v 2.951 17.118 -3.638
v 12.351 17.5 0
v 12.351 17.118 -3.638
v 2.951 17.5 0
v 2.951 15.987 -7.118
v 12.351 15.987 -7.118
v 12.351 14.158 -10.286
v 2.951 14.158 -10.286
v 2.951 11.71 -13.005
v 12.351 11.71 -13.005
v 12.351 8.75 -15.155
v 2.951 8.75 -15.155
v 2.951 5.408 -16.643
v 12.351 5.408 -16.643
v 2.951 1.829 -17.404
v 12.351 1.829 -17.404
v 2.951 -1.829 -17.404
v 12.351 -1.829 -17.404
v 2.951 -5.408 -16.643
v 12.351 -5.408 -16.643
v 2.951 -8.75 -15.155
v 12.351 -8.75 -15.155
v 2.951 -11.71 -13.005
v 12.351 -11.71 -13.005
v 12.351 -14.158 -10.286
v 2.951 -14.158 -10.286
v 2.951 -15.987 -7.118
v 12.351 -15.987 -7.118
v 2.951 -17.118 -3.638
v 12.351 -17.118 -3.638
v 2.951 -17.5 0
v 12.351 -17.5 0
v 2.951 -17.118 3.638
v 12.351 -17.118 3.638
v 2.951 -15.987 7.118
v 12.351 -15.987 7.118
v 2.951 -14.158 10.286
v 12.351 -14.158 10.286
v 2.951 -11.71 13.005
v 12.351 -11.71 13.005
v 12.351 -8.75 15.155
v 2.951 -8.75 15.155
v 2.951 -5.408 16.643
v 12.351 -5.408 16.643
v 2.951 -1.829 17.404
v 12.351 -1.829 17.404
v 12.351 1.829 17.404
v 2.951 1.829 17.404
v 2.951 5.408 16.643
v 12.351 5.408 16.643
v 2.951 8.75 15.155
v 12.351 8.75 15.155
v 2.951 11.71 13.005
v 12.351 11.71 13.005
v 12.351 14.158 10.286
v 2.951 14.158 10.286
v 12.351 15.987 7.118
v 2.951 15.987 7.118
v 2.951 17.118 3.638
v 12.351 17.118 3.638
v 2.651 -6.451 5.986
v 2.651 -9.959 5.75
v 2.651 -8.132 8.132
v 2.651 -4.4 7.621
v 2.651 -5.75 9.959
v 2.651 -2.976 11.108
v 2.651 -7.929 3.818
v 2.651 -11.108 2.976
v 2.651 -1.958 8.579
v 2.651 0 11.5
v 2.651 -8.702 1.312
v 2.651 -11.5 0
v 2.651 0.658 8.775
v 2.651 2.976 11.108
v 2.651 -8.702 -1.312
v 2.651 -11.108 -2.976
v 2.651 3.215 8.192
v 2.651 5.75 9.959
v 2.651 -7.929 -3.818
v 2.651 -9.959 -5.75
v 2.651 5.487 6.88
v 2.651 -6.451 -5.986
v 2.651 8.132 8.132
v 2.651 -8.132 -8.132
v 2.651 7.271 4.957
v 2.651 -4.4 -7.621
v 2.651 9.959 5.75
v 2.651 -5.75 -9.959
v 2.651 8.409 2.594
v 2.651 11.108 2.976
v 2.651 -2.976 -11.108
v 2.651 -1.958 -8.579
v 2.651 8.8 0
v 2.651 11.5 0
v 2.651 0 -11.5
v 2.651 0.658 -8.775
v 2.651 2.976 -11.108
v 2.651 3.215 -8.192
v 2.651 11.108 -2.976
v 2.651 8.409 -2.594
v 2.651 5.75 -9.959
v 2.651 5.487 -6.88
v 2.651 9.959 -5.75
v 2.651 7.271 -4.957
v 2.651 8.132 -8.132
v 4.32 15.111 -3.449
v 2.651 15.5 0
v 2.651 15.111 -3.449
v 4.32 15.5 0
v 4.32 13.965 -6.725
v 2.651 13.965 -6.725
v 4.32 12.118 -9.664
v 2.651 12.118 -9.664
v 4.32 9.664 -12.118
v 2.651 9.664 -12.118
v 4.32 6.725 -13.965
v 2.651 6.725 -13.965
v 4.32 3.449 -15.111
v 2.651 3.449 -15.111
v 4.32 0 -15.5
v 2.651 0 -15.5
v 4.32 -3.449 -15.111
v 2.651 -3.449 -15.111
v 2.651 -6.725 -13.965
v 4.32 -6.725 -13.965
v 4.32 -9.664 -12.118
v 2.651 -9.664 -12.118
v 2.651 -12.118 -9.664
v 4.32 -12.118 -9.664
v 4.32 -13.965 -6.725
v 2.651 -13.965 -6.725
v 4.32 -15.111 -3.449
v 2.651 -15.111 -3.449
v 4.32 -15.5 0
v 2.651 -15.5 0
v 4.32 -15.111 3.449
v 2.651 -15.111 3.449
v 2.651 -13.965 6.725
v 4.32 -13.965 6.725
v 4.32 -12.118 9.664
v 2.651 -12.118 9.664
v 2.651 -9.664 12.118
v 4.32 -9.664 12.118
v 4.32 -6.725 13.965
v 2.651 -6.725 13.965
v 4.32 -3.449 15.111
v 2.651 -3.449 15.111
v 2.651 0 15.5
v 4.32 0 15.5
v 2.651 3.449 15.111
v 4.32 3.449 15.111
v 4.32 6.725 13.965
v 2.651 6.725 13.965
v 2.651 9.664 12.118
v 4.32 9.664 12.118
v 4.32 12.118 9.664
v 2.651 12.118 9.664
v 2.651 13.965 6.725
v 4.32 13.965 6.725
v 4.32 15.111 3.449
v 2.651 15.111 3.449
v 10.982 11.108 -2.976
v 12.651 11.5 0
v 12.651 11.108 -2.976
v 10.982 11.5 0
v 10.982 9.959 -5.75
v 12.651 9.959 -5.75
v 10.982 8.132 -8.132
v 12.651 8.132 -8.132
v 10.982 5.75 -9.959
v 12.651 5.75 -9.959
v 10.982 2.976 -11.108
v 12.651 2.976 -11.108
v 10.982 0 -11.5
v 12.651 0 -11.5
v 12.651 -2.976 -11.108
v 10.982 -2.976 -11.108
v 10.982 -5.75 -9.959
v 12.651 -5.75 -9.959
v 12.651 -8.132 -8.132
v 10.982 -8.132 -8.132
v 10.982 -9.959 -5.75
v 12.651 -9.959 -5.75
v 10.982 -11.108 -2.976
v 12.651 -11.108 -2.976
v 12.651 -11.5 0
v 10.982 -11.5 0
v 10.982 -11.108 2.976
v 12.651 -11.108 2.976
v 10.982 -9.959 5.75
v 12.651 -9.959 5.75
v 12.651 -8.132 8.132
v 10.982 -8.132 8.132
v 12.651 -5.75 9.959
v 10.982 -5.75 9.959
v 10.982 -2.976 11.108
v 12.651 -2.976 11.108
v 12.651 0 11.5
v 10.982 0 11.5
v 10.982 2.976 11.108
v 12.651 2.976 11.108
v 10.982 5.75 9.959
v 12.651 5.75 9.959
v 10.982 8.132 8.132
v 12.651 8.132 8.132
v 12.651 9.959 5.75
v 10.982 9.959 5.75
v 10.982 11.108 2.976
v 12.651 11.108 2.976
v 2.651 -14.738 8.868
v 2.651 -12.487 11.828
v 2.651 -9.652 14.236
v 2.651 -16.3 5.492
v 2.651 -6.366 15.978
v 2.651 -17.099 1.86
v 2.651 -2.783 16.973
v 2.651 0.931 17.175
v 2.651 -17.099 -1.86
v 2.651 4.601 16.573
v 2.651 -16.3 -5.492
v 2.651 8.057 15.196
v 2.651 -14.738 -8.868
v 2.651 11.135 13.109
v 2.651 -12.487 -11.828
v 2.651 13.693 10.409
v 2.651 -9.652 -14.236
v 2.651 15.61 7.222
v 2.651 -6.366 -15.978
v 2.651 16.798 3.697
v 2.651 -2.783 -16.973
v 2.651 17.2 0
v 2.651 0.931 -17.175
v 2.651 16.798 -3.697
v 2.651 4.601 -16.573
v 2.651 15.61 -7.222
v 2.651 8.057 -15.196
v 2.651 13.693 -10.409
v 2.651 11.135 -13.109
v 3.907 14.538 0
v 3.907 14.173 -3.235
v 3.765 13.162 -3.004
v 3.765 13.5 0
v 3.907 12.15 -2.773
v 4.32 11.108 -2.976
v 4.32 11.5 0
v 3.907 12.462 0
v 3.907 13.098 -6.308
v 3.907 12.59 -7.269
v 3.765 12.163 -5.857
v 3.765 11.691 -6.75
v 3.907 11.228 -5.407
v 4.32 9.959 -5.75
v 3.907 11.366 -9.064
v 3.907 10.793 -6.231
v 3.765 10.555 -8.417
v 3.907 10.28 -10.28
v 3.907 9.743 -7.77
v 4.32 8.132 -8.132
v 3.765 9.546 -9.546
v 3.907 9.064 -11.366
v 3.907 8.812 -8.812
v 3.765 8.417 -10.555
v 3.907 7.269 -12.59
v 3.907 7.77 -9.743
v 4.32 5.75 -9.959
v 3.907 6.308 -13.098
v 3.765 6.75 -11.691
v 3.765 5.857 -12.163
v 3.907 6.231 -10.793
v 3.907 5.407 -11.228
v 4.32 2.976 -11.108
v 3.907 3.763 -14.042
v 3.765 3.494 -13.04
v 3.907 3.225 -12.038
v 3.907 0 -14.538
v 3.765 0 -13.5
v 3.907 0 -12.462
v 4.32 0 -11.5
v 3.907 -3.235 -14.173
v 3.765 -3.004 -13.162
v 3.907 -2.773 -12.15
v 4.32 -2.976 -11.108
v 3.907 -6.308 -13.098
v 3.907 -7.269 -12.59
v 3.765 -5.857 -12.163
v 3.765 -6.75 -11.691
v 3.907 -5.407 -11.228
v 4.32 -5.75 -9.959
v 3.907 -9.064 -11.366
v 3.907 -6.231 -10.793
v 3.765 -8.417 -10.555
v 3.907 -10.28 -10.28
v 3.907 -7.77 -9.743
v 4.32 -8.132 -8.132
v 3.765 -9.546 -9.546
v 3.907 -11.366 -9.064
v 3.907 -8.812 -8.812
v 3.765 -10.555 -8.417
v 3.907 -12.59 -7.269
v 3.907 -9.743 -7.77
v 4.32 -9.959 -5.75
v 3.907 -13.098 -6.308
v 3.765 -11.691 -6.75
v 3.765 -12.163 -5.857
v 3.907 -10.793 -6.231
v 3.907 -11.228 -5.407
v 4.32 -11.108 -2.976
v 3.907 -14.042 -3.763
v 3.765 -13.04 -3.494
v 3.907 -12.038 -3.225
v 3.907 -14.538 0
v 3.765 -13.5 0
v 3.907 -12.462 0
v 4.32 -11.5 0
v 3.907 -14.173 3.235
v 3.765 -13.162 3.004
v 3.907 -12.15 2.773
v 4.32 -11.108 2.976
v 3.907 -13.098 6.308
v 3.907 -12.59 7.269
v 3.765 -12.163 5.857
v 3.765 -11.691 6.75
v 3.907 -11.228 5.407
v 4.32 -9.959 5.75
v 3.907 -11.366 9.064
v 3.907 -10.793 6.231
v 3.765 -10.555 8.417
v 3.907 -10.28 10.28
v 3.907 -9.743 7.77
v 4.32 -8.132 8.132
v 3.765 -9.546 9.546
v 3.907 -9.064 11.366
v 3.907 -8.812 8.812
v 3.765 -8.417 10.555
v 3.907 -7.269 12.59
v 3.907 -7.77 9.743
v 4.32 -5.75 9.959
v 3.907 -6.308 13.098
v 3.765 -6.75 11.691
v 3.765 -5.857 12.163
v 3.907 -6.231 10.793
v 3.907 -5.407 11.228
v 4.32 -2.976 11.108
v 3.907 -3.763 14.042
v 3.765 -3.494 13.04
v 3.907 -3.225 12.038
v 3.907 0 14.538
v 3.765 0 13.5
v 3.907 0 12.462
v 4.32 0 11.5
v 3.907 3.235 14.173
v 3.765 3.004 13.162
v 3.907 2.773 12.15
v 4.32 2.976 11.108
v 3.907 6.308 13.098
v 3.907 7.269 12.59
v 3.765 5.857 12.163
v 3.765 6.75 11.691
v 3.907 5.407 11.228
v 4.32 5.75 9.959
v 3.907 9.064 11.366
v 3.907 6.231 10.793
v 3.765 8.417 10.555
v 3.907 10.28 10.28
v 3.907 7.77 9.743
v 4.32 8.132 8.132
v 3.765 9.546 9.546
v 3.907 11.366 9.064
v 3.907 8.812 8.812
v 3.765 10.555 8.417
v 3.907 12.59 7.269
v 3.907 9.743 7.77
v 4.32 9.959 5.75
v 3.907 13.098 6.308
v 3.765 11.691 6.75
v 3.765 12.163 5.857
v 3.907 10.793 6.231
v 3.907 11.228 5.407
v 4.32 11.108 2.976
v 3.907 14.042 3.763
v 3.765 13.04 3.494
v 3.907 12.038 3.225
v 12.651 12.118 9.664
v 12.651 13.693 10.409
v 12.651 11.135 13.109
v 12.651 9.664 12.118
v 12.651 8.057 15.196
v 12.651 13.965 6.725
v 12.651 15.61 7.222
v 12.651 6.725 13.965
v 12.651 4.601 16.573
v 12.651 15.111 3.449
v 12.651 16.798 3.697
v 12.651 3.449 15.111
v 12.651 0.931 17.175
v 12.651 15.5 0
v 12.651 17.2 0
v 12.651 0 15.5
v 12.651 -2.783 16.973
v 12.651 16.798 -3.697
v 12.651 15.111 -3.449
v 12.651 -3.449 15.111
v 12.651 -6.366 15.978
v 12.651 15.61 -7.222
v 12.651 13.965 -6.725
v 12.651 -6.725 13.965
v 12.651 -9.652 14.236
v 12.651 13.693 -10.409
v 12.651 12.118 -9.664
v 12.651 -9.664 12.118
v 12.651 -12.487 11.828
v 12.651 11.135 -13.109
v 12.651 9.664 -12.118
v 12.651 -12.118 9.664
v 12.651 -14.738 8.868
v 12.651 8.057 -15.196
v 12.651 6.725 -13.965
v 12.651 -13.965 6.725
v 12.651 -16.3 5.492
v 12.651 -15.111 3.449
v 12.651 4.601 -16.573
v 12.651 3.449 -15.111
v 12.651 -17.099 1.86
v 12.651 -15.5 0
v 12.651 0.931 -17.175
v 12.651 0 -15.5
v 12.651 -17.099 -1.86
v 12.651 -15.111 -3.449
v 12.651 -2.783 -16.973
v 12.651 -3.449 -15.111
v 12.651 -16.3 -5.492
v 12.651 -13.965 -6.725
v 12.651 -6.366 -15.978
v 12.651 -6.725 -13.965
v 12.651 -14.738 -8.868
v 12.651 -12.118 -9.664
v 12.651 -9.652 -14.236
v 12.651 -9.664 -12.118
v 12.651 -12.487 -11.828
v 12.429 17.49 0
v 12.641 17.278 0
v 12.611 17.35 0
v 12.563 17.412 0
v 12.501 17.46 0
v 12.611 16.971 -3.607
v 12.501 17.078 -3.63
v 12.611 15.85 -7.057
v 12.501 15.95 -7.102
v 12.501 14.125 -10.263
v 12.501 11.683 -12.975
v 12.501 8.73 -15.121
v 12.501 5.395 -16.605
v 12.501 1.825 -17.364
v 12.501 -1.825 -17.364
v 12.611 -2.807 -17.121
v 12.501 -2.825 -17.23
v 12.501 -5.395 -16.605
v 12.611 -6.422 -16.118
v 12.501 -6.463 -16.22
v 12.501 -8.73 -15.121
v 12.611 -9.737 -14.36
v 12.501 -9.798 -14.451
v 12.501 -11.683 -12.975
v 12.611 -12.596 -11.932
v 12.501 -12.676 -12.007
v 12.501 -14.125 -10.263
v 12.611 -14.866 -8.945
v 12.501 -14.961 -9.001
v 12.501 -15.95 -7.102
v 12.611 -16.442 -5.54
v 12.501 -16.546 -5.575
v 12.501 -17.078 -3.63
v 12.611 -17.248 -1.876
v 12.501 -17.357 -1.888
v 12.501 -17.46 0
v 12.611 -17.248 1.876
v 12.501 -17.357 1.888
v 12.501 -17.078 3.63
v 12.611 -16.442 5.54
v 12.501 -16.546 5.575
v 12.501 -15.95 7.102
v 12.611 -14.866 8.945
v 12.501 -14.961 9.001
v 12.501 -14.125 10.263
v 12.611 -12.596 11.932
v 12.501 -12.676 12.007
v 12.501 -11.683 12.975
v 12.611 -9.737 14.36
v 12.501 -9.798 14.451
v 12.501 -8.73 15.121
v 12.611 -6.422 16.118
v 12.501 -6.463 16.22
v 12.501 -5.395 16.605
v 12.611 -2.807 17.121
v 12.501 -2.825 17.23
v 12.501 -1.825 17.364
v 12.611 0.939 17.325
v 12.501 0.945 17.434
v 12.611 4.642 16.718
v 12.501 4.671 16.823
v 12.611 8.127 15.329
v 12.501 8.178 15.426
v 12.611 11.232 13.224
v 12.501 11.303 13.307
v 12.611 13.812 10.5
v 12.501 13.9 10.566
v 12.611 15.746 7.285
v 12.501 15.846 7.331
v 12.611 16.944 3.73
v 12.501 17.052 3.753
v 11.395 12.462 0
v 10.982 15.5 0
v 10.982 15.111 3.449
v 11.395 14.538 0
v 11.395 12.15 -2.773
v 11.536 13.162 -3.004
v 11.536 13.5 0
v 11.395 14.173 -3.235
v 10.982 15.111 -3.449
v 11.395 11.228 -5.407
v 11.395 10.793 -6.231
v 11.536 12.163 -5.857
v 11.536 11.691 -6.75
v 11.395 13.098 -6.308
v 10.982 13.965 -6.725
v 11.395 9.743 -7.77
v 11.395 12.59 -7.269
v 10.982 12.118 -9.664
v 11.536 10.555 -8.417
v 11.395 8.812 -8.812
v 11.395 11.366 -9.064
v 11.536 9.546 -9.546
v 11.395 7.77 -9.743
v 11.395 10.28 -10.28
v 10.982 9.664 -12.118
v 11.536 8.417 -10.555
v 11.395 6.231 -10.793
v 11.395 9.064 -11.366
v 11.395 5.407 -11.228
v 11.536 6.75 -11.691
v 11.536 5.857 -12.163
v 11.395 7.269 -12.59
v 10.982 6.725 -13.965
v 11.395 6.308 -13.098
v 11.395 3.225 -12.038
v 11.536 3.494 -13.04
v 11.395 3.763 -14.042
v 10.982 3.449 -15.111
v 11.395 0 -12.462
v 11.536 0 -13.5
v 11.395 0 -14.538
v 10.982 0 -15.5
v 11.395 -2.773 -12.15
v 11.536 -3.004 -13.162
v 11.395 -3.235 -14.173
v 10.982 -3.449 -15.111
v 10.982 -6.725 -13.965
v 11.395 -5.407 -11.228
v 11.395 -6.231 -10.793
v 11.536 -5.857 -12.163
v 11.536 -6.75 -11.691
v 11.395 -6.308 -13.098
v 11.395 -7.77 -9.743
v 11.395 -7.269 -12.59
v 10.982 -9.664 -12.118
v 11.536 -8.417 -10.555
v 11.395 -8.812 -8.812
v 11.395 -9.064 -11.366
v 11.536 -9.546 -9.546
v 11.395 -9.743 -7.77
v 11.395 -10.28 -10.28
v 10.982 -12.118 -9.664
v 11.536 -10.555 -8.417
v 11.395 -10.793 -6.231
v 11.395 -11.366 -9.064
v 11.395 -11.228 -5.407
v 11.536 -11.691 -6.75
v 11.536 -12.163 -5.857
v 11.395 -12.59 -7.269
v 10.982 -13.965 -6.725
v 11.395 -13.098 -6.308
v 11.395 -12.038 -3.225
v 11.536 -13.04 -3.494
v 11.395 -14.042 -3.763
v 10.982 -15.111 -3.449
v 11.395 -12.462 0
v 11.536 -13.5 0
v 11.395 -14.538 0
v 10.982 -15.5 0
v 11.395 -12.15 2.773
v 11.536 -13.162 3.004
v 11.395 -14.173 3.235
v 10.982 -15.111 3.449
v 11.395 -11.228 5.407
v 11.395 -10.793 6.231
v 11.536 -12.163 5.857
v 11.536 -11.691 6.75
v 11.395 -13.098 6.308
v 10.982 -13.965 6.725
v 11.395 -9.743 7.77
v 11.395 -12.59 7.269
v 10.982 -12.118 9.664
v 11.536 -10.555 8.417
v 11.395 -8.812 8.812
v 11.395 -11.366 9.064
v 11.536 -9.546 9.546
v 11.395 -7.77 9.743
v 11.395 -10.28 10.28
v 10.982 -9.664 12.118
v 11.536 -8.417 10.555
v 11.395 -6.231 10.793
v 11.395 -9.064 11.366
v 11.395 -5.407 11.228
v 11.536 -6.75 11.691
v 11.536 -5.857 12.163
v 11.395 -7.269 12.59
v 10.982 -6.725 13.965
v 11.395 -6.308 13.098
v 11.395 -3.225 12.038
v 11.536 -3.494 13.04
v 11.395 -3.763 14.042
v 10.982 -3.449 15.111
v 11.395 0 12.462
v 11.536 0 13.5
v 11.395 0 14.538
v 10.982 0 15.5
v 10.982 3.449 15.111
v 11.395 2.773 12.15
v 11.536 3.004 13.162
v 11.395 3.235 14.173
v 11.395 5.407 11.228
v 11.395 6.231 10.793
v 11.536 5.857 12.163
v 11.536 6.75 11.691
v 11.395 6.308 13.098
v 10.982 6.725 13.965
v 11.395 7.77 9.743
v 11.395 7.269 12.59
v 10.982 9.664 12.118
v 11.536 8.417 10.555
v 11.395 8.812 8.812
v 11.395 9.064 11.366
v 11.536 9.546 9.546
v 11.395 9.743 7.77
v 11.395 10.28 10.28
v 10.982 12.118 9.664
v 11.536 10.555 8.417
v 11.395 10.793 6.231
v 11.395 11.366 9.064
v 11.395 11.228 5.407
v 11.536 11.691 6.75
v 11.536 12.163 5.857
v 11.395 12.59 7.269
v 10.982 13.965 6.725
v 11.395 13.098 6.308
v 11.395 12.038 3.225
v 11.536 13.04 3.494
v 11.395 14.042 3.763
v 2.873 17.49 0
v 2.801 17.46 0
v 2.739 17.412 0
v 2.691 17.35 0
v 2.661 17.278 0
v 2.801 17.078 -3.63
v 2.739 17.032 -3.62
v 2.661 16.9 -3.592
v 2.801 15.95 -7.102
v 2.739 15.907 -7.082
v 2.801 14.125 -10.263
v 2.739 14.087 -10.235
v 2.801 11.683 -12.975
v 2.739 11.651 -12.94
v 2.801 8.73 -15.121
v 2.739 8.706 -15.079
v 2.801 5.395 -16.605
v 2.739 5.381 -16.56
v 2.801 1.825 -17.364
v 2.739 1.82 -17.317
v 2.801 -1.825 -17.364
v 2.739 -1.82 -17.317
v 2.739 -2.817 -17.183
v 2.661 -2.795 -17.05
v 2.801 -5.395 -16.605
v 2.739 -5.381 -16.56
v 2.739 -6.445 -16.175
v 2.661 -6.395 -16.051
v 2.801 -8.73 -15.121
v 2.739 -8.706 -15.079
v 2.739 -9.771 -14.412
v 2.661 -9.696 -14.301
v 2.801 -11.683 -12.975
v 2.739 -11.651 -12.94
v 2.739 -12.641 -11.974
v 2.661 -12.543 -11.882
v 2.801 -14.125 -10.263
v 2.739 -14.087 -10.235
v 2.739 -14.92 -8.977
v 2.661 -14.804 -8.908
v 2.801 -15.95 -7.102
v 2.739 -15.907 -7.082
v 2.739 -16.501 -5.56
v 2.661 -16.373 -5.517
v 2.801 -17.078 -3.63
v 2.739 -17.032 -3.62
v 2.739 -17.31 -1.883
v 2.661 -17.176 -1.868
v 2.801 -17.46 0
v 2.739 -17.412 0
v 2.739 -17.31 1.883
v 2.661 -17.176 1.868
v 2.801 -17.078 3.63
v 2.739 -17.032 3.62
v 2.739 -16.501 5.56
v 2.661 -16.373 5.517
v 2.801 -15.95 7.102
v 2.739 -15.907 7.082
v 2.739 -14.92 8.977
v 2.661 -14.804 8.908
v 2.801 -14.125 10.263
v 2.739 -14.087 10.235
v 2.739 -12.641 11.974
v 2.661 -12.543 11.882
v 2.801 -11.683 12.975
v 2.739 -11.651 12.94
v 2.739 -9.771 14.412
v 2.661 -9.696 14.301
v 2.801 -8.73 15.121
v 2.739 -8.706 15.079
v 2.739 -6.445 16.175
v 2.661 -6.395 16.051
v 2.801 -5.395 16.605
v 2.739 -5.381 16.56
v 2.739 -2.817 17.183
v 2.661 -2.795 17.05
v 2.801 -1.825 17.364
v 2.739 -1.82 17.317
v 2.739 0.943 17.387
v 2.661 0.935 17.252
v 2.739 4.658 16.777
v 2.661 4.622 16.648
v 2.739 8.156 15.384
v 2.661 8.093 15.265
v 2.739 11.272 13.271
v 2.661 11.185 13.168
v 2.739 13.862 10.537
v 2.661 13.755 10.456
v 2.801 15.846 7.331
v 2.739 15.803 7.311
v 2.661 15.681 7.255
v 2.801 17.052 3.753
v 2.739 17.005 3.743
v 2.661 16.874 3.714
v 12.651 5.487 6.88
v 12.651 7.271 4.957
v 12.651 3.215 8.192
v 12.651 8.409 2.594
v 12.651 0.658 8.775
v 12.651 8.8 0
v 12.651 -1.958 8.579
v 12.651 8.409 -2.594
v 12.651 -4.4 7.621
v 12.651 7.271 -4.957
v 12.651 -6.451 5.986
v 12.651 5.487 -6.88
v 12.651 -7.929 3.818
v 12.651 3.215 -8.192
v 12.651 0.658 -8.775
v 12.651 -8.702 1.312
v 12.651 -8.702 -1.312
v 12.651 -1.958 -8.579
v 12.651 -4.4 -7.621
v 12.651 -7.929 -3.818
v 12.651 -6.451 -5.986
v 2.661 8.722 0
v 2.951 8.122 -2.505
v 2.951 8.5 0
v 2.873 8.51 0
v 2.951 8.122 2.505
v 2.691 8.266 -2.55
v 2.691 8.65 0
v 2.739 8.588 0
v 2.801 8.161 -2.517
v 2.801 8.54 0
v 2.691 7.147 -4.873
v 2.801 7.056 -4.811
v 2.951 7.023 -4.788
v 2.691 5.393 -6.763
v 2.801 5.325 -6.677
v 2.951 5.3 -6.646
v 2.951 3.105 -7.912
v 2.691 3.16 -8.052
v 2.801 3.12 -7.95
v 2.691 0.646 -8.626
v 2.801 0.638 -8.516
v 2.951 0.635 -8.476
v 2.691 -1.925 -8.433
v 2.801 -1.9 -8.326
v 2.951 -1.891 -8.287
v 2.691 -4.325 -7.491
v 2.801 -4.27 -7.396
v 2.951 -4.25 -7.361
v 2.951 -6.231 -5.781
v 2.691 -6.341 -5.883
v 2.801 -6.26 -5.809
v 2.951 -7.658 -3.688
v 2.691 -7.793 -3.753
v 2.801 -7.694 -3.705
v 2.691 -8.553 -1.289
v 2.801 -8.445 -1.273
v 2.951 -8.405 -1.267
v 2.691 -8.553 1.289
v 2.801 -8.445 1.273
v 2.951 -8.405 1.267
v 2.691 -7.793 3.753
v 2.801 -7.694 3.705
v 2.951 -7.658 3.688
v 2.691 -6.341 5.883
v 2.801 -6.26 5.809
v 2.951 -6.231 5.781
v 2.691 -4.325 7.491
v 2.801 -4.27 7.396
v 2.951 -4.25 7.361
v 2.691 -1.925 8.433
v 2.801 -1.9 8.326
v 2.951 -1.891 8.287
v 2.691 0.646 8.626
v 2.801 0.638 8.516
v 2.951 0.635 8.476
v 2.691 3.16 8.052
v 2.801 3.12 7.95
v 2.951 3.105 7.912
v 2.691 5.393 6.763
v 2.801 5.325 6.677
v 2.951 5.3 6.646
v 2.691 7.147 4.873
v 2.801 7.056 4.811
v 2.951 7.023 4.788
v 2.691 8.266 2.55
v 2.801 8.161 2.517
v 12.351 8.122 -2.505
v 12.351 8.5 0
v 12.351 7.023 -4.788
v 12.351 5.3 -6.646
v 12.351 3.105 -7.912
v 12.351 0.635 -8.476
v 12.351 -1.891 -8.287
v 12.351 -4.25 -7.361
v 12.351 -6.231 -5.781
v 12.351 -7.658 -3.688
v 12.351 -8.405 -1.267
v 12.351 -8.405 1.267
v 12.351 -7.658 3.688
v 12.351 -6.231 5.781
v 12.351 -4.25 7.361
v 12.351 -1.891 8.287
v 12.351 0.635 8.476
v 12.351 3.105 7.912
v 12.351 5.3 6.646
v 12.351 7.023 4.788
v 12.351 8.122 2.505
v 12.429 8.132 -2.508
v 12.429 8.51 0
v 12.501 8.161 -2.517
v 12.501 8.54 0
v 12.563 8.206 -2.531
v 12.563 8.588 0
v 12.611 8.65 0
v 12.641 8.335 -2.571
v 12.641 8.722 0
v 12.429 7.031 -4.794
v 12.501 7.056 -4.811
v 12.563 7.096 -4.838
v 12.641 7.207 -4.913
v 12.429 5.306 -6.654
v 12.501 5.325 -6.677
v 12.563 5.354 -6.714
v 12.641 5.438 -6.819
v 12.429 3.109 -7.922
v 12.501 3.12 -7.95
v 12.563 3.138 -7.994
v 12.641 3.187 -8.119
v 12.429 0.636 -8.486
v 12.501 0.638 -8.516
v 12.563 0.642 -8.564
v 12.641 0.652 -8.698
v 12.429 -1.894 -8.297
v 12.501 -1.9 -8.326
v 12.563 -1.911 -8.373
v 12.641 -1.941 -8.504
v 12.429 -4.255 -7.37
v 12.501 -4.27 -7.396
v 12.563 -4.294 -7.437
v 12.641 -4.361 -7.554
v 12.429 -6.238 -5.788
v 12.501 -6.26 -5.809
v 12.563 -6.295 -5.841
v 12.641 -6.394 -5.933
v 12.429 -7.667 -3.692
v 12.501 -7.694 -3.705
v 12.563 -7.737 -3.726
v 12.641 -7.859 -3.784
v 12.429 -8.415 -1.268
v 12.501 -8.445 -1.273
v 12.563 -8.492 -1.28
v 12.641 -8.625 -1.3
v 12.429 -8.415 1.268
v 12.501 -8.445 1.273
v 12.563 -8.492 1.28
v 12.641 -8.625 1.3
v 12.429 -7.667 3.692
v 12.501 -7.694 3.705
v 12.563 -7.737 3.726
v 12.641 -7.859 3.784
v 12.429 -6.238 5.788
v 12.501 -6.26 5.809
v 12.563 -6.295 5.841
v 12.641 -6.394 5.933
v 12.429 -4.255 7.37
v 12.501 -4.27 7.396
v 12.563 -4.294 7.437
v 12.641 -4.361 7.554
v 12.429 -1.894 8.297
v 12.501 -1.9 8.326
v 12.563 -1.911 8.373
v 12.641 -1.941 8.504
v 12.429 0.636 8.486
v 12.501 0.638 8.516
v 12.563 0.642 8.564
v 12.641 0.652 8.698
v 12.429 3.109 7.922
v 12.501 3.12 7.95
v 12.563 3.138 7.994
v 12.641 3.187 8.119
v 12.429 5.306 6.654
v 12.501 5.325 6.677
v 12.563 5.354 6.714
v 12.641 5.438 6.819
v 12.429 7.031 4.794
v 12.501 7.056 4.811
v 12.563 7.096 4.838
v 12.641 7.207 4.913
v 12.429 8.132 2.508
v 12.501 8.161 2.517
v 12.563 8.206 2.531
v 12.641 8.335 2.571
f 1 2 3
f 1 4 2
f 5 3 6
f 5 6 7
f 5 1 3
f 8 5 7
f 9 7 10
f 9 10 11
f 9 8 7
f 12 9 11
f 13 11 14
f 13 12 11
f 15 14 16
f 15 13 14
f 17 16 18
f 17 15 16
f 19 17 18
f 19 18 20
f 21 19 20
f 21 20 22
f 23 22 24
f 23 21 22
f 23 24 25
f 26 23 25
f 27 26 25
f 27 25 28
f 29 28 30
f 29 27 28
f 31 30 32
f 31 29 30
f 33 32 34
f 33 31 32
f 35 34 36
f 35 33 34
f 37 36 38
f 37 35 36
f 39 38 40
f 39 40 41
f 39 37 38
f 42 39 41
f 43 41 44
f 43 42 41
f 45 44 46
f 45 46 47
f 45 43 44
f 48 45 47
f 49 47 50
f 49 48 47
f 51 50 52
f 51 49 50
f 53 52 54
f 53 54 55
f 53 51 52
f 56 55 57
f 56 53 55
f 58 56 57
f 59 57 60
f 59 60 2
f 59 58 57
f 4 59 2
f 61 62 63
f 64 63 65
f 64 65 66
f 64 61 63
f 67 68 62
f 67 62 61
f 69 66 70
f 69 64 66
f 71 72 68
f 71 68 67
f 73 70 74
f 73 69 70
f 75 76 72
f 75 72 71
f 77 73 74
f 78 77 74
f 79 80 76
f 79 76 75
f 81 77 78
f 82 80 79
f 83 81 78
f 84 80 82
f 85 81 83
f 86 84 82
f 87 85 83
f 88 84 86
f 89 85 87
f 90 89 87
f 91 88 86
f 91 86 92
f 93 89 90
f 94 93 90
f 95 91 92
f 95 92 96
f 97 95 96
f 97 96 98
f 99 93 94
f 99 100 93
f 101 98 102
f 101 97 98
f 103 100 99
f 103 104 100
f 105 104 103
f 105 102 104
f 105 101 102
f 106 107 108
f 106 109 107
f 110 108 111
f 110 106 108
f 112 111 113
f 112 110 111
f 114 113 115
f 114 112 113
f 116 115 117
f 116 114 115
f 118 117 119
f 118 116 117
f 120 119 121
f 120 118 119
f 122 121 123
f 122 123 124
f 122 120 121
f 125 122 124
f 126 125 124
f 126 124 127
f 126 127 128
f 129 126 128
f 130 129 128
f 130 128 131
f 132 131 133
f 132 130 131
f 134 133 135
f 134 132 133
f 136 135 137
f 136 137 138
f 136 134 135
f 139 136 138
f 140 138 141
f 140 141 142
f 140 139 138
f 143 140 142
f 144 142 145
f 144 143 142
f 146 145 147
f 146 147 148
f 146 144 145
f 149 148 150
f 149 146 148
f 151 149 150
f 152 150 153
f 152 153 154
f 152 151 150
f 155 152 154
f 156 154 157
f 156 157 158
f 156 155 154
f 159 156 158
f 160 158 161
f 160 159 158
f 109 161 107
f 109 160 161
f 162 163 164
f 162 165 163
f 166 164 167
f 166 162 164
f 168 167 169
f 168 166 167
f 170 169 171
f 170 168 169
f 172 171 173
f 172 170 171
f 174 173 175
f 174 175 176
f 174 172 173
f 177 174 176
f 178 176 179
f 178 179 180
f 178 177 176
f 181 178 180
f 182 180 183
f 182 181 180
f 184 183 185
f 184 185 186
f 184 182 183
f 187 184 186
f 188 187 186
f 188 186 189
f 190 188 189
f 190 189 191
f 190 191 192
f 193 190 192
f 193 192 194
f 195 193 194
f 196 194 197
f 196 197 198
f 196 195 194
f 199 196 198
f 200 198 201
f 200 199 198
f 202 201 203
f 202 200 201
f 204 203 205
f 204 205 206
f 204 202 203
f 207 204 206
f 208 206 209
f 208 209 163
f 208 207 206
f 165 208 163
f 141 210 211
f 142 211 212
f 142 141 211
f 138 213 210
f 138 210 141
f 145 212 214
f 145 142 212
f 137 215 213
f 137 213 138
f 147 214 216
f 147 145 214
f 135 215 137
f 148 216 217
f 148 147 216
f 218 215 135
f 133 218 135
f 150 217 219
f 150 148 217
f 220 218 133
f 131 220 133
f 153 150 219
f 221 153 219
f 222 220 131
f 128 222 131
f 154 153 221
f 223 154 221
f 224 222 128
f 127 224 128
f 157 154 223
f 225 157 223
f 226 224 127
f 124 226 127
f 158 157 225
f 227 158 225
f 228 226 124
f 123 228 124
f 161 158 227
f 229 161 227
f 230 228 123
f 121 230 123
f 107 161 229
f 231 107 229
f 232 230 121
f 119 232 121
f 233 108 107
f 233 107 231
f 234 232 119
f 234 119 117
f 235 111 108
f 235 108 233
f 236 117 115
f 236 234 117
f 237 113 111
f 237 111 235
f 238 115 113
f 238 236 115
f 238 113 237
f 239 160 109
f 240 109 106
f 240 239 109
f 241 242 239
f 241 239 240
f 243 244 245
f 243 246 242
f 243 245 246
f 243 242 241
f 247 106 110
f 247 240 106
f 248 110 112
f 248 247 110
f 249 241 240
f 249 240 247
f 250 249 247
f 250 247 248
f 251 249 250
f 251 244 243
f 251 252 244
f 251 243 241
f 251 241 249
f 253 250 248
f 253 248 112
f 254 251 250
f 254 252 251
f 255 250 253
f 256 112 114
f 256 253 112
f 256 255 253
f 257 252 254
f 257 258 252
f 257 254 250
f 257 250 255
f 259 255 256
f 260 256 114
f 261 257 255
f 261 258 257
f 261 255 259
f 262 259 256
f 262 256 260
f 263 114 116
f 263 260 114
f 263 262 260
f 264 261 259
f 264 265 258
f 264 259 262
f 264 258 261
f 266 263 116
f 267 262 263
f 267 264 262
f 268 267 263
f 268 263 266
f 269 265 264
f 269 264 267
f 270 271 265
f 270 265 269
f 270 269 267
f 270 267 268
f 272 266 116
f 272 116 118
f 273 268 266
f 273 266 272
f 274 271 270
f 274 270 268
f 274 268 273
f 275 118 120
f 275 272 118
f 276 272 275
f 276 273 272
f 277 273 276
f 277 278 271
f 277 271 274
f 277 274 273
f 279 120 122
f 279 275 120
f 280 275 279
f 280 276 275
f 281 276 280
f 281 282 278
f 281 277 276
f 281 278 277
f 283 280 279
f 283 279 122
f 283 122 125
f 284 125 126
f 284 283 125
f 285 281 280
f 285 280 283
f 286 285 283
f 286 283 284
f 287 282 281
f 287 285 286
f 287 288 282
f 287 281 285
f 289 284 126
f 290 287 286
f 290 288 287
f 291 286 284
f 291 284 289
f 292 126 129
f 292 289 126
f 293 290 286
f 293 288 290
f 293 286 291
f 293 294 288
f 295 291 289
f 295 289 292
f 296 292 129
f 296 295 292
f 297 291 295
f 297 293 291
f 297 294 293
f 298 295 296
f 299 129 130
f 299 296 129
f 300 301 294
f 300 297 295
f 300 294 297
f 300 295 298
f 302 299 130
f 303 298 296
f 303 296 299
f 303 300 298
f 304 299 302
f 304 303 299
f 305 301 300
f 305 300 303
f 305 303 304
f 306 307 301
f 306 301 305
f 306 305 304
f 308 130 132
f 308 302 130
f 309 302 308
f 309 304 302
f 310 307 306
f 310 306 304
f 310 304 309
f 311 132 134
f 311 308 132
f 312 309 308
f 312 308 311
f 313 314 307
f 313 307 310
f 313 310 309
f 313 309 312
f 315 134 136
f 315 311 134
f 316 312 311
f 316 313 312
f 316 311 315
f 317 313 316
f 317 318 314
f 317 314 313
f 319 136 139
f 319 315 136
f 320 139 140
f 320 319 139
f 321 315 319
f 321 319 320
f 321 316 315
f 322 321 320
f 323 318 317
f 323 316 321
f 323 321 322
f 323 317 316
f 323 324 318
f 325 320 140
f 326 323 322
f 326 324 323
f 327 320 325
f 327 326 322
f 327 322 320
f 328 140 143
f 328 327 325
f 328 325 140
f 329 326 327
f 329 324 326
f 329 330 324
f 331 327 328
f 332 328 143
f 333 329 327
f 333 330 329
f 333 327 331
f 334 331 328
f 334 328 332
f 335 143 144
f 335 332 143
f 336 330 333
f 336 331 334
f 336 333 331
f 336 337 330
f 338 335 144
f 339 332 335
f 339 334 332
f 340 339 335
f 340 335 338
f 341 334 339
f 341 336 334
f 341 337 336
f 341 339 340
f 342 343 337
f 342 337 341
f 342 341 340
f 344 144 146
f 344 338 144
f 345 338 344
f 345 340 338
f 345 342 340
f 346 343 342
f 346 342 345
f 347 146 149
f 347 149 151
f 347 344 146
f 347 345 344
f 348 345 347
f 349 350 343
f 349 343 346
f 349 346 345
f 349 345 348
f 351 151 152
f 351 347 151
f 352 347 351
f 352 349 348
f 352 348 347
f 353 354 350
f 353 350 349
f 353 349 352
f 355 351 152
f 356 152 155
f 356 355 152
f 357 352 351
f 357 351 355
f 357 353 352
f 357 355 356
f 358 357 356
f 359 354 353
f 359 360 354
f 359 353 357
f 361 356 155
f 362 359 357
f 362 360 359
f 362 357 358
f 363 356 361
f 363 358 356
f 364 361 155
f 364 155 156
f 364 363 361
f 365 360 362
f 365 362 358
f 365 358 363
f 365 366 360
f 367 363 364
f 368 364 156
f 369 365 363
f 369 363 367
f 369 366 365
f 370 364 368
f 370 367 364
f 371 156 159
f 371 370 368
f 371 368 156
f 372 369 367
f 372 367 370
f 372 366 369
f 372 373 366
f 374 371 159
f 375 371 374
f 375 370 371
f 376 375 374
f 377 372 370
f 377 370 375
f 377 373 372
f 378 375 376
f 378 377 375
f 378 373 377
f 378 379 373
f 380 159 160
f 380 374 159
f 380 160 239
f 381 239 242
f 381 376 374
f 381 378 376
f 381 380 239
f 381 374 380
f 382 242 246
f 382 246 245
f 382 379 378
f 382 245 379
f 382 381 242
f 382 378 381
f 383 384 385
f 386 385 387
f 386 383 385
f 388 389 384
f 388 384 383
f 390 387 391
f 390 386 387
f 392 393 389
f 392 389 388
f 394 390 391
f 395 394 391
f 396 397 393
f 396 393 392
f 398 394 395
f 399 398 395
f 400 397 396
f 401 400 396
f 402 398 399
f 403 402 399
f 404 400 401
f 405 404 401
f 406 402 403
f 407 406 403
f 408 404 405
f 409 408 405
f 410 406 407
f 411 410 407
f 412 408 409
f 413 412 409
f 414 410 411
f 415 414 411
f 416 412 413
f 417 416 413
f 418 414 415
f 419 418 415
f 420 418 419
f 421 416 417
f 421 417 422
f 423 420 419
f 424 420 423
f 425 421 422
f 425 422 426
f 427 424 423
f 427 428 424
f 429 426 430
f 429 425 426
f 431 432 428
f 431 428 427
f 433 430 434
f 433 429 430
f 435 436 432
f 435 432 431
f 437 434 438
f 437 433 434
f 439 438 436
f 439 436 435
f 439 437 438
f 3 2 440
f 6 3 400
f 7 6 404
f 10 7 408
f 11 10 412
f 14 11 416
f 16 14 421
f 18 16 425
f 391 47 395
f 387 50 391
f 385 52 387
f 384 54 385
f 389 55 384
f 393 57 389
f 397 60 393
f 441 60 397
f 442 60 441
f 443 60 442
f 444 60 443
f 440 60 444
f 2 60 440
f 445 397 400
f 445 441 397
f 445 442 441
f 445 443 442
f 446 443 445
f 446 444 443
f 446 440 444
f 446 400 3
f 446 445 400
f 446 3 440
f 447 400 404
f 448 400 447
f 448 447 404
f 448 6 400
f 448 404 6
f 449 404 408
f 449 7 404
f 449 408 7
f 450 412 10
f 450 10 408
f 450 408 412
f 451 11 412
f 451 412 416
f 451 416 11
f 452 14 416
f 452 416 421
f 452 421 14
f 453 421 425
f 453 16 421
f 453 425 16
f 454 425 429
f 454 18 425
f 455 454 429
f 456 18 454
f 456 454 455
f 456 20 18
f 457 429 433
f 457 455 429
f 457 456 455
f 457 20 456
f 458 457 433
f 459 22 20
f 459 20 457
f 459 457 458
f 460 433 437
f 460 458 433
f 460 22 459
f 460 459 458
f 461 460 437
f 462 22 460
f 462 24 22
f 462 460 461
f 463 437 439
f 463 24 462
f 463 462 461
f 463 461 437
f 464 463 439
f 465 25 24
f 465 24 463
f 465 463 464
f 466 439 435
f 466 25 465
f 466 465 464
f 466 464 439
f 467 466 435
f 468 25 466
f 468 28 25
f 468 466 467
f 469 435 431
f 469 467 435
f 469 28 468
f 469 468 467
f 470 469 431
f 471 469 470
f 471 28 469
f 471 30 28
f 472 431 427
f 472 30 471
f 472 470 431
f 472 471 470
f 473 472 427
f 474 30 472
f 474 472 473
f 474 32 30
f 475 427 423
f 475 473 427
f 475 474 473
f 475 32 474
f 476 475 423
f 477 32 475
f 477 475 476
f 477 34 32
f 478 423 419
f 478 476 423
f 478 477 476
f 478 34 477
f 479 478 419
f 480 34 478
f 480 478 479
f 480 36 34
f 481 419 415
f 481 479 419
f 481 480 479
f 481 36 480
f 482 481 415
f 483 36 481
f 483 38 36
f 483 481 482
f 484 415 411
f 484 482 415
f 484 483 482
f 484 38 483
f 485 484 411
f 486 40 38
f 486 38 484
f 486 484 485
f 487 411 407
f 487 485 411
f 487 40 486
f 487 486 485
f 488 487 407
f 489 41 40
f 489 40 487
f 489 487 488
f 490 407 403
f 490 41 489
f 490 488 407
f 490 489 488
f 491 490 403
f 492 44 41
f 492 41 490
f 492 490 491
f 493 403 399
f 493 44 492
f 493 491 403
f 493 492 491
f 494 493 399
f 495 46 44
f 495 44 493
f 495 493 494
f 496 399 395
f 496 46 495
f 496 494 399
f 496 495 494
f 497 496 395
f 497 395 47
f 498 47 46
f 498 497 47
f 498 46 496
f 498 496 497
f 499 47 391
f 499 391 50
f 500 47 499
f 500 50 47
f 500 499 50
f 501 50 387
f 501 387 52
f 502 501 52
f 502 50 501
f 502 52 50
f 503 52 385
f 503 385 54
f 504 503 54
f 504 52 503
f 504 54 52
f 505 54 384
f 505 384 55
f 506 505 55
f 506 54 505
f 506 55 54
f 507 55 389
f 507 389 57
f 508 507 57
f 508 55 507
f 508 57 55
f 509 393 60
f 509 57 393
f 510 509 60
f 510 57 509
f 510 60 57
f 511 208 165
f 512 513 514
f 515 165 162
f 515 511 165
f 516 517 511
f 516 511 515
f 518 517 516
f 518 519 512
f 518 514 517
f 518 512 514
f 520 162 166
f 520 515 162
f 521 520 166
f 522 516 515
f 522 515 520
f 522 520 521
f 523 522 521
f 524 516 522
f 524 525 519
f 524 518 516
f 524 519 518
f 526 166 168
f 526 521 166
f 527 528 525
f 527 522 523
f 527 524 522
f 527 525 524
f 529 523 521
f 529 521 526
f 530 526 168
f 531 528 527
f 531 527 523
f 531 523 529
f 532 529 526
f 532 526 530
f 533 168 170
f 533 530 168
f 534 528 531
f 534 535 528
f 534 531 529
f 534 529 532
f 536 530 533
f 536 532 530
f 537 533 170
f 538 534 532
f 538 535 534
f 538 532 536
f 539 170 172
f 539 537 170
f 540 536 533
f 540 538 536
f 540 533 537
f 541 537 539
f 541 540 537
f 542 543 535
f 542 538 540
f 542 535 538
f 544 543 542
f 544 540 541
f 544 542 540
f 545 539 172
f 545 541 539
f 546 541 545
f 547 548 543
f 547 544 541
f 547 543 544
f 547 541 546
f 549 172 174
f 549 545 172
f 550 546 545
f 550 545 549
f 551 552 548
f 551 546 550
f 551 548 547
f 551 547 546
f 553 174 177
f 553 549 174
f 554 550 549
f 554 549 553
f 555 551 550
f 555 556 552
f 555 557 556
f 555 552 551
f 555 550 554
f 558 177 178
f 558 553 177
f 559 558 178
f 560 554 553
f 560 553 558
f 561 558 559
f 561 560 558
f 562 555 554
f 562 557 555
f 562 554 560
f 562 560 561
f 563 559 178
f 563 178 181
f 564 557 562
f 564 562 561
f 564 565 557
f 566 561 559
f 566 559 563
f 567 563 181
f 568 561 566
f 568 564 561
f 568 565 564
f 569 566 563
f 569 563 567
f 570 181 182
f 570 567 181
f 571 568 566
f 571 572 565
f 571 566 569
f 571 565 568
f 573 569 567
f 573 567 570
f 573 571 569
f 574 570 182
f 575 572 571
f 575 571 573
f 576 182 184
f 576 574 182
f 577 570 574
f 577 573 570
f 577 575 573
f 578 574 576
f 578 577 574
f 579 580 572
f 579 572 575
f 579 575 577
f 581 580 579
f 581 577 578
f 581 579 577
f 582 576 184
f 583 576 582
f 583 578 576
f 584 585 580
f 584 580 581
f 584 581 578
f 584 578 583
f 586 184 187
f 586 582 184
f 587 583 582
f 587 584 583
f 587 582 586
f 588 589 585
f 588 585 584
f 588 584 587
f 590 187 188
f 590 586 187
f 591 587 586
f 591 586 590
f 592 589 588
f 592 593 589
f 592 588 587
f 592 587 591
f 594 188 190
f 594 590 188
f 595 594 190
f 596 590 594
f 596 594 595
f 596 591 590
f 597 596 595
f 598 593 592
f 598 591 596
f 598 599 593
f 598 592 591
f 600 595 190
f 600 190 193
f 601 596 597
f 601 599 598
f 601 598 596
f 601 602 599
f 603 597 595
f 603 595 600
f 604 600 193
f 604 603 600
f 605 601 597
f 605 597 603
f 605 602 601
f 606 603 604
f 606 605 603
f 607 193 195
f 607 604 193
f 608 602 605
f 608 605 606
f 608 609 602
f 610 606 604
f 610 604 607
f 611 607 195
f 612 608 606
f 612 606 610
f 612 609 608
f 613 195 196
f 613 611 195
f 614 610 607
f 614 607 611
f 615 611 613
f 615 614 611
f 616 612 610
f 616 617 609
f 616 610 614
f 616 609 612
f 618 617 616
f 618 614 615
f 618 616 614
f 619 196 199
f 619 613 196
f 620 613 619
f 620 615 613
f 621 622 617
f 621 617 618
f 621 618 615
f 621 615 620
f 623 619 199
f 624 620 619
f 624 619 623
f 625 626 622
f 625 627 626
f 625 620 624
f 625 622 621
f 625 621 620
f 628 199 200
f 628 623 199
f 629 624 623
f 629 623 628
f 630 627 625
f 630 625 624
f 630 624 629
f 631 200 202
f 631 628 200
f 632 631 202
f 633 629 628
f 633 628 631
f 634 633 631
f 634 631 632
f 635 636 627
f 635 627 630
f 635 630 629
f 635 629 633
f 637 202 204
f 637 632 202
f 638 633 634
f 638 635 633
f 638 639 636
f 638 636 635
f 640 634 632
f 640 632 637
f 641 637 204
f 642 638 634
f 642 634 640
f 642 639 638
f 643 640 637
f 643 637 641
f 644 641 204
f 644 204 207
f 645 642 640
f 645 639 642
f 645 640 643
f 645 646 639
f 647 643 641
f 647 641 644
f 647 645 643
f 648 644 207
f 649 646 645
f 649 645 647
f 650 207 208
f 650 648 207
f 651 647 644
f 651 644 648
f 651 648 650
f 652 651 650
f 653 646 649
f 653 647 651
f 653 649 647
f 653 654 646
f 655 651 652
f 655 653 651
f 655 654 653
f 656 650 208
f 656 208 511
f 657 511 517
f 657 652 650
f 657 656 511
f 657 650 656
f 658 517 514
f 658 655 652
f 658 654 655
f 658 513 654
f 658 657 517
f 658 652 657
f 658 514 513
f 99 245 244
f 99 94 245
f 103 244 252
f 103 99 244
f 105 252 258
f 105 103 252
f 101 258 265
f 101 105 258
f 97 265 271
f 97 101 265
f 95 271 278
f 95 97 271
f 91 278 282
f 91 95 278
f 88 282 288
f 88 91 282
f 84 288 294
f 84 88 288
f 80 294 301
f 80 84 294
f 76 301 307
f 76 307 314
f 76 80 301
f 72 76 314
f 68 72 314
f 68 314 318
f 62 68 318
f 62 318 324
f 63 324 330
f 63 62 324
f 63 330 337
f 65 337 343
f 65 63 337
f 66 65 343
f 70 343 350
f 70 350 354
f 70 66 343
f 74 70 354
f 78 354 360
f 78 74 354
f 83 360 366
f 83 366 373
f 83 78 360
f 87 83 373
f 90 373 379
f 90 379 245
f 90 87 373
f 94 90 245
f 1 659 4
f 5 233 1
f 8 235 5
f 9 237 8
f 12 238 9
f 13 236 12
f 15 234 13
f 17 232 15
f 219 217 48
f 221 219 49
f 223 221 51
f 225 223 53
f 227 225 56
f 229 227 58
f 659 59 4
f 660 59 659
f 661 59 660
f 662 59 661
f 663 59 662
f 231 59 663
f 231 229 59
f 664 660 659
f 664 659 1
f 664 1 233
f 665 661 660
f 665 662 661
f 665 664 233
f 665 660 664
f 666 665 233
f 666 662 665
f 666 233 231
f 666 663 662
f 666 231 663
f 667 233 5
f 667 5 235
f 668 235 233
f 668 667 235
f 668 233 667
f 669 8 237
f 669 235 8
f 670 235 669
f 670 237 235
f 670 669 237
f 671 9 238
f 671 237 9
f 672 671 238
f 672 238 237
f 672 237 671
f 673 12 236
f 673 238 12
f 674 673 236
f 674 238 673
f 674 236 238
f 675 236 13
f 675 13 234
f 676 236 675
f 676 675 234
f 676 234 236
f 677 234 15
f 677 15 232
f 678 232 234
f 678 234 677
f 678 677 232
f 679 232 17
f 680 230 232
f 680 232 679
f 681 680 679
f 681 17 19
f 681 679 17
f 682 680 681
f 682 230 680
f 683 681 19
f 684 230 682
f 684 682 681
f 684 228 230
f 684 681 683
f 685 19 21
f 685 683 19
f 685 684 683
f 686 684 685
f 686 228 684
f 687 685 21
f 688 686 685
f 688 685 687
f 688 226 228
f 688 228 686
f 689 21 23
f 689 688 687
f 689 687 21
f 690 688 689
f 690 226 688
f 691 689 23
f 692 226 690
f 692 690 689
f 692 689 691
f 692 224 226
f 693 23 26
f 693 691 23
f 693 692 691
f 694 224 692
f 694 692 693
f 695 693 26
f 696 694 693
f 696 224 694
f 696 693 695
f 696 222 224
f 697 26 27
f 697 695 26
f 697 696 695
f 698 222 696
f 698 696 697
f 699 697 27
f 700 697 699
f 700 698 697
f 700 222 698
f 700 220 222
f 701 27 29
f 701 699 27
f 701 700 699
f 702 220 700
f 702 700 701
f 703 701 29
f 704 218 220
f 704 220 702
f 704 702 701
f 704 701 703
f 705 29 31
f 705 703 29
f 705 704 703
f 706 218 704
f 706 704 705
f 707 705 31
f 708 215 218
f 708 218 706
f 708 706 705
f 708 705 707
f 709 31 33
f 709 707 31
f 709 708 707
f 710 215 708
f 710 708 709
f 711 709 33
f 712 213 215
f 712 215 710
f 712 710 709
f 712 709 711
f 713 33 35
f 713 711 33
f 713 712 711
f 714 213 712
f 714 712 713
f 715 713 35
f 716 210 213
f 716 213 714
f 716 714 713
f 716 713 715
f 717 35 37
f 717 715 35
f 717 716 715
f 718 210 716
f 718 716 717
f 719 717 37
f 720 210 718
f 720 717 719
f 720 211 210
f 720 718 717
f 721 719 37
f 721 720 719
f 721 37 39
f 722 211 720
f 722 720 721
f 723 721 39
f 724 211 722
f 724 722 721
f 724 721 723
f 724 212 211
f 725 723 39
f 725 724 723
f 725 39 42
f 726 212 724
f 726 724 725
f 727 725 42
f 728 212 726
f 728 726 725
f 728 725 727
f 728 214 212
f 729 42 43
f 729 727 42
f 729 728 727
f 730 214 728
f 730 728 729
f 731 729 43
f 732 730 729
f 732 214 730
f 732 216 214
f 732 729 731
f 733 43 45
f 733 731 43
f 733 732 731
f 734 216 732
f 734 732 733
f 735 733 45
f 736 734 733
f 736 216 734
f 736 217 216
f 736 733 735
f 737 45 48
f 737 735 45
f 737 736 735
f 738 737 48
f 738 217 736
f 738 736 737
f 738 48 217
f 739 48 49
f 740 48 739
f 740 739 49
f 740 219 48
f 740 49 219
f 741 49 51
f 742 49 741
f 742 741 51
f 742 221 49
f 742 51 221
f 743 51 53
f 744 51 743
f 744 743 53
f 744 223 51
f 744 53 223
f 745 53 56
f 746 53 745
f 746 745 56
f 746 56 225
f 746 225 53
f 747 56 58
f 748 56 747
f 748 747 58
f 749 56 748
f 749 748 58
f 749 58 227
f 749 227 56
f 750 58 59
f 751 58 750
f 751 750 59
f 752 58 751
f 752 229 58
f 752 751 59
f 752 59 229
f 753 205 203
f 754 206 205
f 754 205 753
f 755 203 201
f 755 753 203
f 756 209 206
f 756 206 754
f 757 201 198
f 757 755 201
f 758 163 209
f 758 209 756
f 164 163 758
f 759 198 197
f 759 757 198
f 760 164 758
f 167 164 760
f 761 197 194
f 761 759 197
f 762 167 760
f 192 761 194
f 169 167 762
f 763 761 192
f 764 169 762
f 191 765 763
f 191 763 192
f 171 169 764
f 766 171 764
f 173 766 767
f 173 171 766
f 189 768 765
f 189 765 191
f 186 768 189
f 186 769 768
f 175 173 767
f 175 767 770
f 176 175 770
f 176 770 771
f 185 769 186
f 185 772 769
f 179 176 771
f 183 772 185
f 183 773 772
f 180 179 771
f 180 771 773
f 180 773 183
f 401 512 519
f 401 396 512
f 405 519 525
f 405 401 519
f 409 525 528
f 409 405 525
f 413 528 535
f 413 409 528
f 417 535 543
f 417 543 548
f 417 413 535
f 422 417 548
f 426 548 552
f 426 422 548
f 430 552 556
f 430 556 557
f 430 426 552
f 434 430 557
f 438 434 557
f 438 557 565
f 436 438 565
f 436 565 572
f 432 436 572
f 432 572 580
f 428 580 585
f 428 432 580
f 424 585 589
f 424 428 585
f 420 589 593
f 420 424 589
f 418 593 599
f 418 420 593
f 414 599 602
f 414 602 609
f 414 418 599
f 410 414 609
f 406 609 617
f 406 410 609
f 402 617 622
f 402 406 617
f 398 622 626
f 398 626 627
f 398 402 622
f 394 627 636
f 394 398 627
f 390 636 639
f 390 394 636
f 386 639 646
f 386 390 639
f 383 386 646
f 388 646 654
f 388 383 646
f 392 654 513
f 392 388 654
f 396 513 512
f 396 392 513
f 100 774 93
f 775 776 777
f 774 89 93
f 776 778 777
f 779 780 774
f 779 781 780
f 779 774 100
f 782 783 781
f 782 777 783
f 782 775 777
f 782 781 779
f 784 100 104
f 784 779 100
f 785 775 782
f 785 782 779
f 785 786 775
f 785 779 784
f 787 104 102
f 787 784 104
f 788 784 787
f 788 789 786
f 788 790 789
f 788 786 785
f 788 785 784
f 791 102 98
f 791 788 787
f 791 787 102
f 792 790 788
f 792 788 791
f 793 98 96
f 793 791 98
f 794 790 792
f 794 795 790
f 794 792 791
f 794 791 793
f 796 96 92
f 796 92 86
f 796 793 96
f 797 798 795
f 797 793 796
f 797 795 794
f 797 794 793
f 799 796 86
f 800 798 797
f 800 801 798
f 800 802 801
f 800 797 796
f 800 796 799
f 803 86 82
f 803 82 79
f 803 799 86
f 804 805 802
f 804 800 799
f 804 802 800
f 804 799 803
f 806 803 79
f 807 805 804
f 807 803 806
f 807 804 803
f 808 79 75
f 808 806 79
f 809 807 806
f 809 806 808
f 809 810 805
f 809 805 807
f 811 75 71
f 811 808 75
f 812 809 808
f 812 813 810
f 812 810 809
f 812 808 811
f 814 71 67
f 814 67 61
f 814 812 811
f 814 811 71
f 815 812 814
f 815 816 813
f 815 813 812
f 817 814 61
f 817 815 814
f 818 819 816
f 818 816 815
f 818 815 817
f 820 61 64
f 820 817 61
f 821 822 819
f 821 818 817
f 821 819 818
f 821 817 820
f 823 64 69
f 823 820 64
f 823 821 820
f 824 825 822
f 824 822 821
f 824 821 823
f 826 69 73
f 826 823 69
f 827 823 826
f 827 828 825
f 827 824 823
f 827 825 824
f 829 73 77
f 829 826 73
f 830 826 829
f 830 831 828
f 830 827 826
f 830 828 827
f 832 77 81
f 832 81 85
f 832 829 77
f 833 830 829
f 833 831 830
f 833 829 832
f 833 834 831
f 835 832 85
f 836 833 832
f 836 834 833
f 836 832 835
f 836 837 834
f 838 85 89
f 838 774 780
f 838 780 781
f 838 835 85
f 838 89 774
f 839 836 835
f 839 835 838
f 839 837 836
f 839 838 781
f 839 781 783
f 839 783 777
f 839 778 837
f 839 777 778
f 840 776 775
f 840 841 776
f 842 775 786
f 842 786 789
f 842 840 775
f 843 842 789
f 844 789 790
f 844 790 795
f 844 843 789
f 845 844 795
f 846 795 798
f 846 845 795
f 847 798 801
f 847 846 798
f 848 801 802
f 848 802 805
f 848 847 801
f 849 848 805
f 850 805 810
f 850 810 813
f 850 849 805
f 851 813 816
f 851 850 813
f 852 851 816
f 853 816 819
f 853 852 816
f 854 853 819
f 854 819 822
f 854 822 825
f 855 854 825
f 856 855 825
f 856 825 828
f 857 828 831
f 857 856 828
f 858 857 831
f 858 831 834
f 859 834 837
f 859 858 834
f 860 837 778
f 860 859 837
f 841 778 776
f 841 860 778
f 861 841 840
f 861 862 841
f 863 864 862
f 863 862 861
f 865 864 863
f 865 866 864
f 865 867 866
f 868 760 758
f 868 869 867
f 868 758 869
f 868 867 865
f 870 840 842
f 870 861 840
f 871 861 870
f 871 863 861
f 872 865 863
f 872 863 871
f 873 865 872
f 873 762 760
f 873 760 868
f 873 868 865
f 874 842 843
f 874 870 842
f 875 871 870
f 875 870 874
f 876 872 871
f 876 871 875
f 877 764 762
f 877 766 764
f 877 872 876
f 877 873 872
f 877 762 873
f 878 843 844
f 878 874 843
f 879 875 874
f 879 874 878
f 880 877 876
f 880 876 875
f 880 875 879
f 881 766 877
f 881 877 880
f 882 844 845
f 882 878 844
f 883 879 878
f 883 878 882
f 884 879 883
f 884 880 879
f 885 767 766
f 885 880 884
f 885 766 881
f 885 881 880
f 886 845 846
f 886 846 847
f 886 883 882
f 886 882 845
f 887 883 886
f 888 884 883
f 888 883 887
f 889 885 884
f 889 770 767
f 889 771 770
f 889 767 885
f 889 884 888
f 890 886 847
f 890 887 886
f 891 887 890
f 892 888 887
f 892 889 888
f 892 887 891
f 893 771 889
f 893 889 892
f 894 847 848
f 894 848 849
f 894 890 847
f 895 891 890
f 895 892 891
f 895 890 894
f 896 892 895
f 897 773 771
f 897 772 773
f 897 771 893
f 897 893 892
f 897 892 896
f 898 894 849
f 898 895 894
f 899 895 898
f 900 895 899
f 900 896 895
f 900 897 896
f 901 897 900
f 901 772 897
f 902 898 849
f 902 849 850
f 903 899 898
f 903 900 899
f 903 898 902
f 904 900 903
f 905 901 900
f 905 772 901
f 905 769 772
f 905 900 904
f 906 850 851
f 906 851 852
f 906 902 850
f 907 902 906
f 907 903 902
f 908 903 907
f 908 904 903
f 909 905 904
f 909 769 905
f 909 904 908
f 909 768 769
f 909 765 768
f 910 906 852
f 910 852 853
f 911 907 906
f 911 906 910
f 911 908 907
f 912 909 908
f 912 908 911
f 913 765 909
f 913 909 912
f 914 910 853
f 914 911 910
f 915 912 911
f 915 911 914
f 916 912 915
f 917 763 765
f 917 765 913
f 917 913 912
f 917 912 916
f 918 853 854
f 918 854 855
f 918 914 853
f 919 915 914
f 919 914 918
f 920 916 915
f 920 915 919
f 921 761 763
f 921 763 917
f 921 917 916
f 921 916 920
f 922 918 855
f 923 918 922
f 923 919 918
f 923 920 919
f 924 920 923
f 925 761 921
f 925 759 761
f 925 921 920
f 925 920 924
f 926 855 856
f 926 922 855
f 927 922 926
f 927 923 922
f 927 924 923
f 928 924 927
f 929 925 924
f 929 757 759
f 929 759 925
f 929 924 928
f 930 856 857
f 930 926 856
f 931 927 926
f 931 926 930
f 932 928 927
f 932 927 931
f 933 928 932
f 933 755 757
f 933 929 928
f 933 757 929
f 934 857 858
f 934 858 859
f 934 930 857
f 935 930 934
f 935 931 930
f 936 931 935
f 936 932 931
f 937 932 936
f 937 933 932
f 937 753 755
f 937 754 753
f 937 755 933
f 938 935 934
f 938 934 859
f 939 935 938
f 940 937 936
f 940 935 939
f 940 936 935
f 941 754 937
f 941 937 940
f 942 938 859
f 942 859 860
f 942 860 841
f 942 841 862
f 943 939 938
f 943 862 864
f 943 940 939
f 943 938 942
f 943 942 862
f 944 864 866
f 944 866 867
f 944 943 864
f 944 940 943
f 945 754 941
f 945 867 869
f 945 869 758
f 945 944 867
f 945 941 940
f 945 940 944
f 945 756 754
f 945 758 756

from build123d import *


with BuildPart() as part:
    # Sketch1 → Revolve1 (revolve)
    with BuildSketch(Plane.XY):
        with BuildLine():
            Line((2.65093816, 15.5), (4.319649297, 15.5))
            ThreePointArc((4.319649297, 15.5), (3.765389873, 13.5), (4.319649297, 11.5))
            Line((4.319649297, 11.5), (2.65093816, 11.5))
            Line((2.65093816, 11.5), (2.65093816, 8.8))
            ThreePointArc((2.65093816, 8.8), (2.738806126, 8.587867966), (2.95093816, 8.5))
            Line((2.95093816, 8.5), (12.35093816, 8.5))
            ThreePointArc((12.35093816, 8.5), (12.563070194, 8.587867966), (12.65093816, 8.8))
            Line((12.65093816, 8.8), (12.65093816, 11.5))
            Line((12.65093816, 11.5), (10.982227023, 11.5))
            ThreePointArc((10.982227023, 11.5), (11.536486446, 13.5), (10.982227023, 15.5))
            Line((10.982227023, 15.5), (12.65093816, 15.5))
            Line((12.65093816, 15.5), (12.65093816, 17.2))
            ThreePointArc((12.65093816, 17.2), (12.563070194, 17.412132034), (12.35093816, 17.5))
            Line((12.35093816, 17.5), (2.95093816, 17.5))
            ThreePointArc((2.95093816, 17.5), (2.738806126, 17.412132034), (2.65093816, 17.2))
            Line((2.65093816, 17.2), (2.65093816, 15.5))
        make_face()
    revolve(axis=Axis((14.7, 0, 0), (-1, 0, 0)))


solid = part.part
